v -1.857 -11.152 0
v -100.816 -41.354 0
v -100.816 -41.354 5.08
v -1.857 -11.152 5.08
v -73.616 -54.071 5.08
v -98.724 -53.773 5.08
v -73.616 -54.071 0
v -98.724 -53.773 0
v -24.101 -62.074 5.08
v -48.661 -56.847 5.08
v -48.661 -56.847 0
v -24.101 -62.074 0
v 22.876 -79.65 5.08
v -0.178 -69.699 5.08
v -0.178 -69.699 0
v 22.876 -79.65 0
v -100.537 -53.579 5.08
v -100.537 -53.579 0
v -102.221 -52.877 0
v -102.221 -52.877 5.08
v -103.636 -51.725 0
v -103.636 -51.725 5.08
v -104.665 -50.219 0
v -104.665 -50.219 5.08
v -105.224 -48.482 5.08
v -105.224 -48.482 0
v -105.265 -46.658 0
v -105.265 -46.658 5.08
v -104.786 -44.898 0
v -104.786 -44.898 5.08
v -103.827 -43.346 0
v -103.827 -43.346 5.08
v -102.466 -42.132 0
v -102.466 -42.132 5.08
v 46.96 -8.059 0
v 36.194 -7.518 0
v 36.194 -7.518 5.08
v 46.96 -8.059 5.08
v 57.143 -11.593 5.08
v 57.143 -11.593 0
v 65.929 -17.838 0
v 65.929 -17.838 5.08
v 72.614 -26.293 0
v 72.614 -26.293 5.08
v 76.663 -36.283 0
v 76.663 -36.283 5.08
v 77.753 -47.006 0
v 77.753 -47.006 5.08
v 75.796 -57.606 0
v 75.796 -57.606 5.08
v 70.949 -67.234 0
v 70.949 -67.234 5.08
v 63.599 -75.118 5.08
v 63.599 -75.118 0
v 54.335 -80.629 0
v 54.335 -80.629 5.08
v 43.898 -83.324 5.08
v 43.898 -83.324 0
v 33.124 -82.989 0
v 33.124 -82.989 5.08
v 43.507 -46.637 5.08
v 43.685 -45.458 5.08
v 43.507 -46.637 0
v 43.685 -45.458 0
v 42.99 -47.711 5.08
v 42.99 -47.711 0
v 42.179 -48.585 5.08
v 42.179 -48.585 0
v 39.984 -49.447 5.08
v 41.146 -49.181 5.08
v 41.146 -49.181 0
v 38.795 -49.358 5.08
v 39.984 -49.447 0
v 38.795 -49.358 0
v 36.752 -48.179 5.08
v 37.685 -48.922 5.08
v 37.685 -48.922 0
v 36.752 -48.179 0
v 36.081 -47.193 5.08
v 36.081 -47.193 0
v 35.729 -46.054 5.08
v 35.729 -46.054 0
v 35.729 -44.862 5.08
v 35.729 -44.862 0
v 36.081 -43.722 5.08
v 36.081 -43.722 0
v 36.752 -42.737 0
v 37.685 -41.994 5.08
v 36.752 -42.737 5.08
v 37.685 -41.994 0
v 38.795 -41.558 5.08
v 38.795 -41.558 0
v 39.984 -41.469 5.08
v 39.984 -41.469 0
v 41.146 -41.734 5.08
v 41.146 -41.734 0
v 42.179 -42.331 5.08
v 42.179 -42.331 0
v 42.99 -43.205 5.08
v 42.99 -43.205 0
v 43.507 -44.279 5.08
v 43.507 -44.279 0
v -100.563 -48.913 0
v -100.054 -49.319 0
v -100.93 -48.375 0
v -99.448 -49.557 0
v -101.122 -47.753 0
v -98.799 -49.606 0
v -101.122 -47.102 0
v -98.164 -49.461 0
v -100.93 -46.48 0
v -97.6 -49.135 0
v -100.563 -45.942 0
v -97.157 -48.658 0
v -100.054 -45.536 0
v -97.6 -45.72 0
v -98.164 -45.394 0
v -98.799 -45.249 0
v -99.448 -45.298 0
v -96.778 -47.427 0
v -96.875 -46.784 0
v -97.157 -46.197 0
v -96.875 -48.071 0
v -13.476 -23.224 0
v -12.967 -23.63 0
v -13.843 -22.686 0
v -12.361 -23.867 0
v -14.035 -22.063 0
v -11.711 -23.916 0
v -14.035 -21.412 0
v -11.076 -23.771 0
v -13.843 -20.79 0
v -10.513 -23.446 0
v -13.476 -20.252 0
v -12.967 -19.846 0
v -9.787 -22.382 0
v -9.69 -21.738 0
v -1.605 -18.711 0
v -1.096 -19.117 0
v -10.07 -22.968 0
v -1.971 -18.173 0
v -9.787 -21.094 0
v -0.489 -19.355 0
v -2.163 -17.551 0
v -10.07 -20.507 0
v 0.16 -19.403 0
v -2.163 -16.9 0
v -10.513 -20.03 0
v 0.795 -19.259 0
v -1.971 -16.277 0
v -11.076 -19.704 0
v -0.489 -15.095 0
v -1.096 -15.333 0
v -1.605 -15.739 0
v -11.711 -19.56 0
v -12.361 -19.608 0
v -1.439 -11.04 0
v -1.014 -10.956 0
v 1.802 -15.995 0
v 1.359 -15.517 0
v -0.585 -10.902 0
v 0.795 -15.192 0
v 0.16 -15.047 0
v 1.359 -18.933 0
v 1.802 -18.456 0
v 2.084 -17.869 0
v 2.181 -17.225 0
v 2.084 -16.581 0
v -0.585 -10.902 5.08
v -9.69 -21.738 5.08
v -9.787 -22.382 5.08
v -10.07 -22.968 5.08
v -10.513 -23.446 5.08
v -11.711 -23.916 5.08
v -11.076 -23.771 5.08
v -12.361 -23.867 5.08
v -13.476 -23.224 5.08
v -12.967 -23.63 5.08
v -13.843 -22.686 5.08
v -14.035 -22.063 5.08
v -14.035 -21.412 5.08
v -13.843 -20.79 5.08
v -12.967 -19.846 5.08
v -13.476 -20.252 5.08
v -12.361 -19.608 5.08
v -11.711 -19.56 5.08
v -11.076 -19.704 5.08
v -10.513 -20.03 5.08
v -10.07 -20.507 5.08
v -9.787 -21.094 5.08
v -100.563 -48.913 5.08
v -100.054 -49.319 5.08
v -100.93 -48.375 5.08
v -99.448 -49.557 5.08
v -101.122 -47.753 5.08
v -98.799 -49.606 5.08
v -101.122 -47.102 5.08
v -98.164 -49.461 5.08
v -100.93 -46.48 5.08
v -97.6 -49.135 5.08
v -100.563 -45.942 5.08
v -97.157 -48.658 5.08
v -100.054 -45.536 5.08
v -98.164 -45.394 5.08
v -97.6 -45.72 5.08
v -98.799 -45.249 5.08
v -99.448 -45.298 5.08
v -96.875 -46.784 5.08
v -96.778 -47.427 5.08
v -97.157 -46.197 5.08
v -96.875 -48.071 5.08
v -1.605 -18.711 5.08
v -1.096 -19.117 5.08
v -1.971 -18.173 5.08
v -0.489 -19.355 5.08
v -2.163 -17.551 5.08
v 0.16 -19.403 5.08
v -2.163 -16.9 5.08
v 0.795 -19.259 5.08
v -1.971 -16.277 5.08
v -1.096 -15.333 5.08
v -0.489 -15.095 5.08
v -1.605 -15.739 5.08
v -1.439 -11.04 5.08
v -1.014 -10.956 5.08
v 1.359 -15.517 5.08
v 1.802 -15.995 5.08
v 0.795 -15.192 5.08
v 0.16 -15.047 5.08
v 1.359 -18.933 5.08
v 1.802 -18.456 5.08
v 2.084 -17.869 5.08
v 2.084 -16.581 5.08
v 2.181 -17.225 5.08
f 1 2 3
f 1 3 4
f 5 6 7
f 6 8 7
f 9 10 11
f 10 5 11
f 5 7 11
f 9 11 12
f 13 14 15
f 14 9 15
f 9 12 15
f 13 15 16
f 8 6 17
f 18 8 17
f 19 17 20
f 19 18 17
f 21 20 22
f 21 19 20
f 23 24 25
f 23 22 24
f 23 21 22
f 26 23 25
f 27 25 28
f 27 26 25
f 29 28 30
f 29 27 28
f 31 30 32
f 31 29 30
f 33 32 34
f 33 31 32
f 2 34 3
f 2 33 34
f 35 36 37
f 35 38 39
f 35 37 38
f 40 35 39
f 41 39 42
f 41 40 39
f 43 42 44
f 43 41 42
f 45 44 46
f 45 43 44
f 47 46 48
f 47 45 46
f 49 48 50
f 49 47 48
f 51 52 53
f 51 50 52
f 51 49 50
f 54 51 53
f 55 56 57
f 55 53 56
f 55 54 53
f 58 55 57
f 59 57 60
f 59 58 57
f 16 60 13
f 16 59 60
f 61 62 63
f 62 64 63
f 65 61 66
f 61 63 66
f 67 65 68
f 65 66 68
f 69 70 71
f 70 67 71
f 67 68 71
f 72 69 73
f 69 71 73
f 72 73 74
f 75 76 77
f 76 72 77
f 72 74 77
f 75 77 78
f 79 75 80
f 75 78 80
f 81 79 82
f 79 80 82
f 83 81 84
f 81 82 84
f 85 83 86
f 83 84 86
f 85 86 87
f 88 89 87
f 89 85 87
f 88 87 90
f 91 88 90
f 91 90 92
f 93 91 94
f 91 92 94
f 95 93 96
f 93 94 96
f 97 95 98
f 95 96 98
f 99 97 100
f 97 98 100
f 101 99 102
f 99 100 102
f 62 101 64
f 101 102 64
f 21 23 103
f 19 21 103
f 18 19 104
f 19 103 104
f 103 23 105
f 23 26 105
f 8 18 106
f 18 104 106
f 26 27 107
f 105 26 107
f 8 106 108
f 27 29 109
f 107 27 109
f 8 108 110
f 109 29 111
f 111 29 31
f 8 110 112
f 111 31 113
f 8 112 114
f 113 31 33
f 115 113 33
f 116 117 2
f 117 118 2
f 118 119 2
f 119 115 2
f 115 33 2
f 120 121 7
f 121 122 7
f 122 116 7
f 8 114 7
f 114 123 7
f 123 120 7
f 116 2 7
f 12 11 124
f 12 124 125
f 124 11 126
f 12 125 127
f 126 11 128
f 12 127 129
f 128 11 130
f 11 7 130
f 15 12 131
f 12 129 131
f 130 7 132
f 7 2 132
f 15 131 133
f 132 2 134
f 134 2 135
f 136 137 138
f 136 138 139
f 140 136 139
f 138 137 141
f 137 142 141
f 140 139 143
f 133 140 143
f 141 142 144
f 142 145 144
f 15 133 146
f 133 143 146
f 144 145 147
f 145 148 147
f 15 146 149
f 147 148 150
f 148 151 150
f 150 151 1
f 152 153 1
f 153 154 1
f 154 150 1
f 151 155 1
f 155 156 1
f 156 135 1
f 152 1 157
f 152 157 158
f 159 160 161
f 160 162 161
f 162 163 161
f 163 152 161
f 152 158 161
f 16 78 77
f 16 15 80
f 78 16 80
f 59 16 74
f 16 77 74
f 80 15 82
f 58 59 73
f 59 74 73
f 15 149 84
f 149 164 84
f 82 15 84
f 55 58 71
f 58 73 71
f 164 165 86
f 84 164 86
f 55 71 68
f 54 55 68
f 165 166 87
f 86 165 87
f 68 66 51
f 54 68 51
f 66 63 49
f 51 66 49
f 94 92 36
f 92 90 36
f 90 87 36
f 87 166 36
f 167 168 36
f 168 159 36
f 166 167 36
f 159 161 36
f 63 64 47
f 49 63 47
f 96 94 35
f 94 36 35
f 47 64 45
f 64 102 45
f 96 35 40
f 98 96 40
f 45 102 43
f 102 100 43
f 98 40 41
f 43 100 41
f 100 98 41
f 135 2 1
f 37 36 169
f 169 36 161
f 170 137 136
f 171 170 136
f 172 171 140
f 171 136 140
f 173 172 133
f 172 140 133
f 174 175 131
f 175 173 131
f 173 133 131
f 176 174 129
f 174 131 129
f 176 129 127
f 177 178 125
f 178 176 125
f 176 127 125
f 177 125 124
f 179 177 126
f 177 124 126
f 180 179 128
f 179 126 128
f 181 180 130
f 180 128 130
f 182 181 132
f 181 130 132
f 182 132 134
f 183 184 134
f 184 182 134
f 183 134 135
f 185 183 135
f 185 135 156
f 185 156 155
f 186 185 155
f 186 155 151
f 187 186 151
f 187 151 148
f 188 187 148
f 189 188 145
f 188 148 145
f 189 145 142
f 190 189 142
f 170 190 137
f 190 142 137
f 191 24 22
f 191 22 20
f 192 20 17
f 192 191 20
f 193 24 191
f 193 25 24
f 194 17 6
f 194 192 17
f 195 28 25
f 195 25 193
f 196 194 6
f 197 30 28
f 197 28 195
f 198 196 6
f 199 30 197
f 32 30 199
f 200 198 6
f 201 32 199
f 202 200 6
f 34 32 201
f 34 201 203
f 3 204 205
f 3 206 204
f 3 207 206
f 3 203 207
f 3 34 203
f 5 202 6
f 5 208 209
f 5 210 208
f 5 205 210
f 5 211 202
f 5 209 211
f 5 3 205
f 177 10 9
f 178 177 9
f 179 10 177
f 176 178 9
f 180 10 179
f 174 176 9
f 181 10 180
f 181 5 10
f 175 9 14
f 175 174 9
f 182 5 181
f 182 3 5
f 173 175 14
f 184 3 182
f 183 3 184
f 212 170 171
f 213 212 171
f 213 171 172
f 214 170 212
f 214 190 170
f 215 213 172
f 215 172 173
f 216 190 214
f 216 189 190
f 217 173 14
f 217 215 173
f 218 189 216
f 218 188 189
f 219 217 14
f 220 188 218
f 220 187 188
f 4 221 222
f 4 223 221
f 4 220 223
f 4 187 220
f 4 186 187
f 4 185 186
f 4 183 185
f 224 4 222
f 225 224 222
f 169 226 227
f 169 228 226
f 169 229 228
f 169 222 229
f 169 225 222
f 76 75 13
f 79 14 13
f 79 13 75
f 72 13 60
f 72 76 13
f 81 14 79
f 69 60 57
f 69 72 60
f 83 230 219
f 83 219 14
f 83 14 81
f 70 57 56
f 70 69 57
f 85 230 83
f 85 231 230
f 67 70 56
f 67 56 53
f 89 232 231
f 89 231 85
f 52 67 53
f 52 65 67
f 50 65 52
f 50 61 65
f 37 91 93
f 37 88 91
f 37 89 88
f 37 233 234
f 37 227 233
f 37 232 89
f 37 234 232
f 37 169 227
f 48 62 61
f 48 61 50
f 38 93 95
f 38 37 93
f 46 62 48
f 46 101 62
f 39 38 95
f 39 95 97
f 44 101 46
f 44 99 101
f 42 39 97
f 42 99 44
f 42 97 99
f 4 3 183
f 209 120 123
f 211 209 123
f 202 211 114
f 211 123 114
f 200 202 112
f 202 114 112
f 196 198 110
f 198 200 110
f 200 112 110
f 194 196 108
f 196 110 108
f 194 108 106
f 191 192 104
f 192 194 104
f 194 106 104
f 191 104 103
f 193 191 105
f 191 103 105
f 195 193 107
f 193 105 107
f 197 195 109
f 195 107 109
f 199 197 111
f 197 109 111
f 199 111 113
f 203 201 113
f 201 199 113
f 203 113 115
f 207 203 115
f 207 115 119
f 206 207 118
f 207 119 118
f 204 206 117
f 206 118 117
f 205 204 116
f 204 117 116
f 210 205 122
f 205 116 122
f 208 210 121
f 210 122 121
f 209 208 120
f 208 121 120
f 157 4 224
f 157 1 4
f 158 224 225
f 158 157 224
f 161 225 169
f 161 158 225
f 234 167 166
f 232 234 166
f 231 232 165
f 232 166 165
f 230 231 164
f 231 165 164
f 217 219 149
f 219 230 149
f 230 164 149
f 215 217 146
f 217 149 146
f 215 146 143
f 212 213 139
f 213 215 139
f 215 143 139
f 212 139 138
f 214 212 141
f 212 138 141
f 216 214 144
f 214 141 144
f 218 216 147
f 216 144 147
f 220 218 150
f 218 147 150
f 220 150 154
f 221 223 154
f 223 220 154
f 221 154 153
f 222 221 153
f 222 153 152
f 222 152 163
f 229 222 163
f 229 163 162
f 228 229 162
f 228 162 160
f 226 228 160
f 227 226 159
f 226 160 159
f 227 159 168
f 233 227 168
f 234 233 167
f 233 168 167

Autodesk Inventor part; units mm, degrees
ref_plane "YZ Plane" through (0, 0, 0) normal (1, 0, 0) x (0, 1, 0)
ref_plane "XZ Plane" through (0, 0, 0) normal (0, 1, 0) x (-1, 0, 0)
ref_plane "XY Plane" through (0, 0, 0) normal (0, 0, 1) x (1, 0, 0)
sketch "Sketch1" plane through (0, 0, 0) normal (0, 0, 1) x (1, 0, 0)
  circle A0 centre (-98.962, -47.4274) radius 2.1844 projected
  circle A1 centre (39.6847, -45.4579) radius 2.9019 construction
  arc A2 (-100.8156, -41.354) -> (-98.7235, -53.773) centre (-98.962, -47.4274) ccw
  arc A3 (22.8757, -79.6496) -> (36.1943, -7.5182) centre (39.6847, -45.4579) ccw
  circle A4 centre (-11.8745, -21.7378) radius 6.35 construction
  arc A5 (-0.585, -10.9018) -> (-1.8569, -11.1517) centre (-0.0033, -17.2251) ccw
  line L0 (-11.8745, -21.7378) -> (-0.0033, -17.2251) construction
  line L1 (-98.962, -47.4274) -> (39.6847, -45.4579) construction
  circle A6 centre (-0.0033, -17.2251) radius 2.1844
  circle A7 centre (-11.8745, -21.7378) radius 2.1844
  line L2 (-100.8156, -41.354) -> (-1.8569, -11.1517)
  line L3 (36.1943, -7.5182) -> (-0.585, -10.9018)
  arc A8 (22.8757, -79.6496) -> (-98.7235, -53.773) centre (-89.1842, -307.5938) ccw
  circle A9 centre (39.6847, -45.4579) radius 4
  point P0 (0, 0)
  dimension "d0" = 12.7
  dimension "d1" = 76.2
  dimension "d2" = 12.7
  dimension "d3" = 20
  dimension "d4" = 4.3688
  dimension "d5" = 4.3688
  dimension "d6" = 254
  dimension "d7" = 8
extrude "Extrusion1" add sketch "Sketch1" along normal blind 5.08
properties part number "intakeside" material "Acetal Resin, Black"
